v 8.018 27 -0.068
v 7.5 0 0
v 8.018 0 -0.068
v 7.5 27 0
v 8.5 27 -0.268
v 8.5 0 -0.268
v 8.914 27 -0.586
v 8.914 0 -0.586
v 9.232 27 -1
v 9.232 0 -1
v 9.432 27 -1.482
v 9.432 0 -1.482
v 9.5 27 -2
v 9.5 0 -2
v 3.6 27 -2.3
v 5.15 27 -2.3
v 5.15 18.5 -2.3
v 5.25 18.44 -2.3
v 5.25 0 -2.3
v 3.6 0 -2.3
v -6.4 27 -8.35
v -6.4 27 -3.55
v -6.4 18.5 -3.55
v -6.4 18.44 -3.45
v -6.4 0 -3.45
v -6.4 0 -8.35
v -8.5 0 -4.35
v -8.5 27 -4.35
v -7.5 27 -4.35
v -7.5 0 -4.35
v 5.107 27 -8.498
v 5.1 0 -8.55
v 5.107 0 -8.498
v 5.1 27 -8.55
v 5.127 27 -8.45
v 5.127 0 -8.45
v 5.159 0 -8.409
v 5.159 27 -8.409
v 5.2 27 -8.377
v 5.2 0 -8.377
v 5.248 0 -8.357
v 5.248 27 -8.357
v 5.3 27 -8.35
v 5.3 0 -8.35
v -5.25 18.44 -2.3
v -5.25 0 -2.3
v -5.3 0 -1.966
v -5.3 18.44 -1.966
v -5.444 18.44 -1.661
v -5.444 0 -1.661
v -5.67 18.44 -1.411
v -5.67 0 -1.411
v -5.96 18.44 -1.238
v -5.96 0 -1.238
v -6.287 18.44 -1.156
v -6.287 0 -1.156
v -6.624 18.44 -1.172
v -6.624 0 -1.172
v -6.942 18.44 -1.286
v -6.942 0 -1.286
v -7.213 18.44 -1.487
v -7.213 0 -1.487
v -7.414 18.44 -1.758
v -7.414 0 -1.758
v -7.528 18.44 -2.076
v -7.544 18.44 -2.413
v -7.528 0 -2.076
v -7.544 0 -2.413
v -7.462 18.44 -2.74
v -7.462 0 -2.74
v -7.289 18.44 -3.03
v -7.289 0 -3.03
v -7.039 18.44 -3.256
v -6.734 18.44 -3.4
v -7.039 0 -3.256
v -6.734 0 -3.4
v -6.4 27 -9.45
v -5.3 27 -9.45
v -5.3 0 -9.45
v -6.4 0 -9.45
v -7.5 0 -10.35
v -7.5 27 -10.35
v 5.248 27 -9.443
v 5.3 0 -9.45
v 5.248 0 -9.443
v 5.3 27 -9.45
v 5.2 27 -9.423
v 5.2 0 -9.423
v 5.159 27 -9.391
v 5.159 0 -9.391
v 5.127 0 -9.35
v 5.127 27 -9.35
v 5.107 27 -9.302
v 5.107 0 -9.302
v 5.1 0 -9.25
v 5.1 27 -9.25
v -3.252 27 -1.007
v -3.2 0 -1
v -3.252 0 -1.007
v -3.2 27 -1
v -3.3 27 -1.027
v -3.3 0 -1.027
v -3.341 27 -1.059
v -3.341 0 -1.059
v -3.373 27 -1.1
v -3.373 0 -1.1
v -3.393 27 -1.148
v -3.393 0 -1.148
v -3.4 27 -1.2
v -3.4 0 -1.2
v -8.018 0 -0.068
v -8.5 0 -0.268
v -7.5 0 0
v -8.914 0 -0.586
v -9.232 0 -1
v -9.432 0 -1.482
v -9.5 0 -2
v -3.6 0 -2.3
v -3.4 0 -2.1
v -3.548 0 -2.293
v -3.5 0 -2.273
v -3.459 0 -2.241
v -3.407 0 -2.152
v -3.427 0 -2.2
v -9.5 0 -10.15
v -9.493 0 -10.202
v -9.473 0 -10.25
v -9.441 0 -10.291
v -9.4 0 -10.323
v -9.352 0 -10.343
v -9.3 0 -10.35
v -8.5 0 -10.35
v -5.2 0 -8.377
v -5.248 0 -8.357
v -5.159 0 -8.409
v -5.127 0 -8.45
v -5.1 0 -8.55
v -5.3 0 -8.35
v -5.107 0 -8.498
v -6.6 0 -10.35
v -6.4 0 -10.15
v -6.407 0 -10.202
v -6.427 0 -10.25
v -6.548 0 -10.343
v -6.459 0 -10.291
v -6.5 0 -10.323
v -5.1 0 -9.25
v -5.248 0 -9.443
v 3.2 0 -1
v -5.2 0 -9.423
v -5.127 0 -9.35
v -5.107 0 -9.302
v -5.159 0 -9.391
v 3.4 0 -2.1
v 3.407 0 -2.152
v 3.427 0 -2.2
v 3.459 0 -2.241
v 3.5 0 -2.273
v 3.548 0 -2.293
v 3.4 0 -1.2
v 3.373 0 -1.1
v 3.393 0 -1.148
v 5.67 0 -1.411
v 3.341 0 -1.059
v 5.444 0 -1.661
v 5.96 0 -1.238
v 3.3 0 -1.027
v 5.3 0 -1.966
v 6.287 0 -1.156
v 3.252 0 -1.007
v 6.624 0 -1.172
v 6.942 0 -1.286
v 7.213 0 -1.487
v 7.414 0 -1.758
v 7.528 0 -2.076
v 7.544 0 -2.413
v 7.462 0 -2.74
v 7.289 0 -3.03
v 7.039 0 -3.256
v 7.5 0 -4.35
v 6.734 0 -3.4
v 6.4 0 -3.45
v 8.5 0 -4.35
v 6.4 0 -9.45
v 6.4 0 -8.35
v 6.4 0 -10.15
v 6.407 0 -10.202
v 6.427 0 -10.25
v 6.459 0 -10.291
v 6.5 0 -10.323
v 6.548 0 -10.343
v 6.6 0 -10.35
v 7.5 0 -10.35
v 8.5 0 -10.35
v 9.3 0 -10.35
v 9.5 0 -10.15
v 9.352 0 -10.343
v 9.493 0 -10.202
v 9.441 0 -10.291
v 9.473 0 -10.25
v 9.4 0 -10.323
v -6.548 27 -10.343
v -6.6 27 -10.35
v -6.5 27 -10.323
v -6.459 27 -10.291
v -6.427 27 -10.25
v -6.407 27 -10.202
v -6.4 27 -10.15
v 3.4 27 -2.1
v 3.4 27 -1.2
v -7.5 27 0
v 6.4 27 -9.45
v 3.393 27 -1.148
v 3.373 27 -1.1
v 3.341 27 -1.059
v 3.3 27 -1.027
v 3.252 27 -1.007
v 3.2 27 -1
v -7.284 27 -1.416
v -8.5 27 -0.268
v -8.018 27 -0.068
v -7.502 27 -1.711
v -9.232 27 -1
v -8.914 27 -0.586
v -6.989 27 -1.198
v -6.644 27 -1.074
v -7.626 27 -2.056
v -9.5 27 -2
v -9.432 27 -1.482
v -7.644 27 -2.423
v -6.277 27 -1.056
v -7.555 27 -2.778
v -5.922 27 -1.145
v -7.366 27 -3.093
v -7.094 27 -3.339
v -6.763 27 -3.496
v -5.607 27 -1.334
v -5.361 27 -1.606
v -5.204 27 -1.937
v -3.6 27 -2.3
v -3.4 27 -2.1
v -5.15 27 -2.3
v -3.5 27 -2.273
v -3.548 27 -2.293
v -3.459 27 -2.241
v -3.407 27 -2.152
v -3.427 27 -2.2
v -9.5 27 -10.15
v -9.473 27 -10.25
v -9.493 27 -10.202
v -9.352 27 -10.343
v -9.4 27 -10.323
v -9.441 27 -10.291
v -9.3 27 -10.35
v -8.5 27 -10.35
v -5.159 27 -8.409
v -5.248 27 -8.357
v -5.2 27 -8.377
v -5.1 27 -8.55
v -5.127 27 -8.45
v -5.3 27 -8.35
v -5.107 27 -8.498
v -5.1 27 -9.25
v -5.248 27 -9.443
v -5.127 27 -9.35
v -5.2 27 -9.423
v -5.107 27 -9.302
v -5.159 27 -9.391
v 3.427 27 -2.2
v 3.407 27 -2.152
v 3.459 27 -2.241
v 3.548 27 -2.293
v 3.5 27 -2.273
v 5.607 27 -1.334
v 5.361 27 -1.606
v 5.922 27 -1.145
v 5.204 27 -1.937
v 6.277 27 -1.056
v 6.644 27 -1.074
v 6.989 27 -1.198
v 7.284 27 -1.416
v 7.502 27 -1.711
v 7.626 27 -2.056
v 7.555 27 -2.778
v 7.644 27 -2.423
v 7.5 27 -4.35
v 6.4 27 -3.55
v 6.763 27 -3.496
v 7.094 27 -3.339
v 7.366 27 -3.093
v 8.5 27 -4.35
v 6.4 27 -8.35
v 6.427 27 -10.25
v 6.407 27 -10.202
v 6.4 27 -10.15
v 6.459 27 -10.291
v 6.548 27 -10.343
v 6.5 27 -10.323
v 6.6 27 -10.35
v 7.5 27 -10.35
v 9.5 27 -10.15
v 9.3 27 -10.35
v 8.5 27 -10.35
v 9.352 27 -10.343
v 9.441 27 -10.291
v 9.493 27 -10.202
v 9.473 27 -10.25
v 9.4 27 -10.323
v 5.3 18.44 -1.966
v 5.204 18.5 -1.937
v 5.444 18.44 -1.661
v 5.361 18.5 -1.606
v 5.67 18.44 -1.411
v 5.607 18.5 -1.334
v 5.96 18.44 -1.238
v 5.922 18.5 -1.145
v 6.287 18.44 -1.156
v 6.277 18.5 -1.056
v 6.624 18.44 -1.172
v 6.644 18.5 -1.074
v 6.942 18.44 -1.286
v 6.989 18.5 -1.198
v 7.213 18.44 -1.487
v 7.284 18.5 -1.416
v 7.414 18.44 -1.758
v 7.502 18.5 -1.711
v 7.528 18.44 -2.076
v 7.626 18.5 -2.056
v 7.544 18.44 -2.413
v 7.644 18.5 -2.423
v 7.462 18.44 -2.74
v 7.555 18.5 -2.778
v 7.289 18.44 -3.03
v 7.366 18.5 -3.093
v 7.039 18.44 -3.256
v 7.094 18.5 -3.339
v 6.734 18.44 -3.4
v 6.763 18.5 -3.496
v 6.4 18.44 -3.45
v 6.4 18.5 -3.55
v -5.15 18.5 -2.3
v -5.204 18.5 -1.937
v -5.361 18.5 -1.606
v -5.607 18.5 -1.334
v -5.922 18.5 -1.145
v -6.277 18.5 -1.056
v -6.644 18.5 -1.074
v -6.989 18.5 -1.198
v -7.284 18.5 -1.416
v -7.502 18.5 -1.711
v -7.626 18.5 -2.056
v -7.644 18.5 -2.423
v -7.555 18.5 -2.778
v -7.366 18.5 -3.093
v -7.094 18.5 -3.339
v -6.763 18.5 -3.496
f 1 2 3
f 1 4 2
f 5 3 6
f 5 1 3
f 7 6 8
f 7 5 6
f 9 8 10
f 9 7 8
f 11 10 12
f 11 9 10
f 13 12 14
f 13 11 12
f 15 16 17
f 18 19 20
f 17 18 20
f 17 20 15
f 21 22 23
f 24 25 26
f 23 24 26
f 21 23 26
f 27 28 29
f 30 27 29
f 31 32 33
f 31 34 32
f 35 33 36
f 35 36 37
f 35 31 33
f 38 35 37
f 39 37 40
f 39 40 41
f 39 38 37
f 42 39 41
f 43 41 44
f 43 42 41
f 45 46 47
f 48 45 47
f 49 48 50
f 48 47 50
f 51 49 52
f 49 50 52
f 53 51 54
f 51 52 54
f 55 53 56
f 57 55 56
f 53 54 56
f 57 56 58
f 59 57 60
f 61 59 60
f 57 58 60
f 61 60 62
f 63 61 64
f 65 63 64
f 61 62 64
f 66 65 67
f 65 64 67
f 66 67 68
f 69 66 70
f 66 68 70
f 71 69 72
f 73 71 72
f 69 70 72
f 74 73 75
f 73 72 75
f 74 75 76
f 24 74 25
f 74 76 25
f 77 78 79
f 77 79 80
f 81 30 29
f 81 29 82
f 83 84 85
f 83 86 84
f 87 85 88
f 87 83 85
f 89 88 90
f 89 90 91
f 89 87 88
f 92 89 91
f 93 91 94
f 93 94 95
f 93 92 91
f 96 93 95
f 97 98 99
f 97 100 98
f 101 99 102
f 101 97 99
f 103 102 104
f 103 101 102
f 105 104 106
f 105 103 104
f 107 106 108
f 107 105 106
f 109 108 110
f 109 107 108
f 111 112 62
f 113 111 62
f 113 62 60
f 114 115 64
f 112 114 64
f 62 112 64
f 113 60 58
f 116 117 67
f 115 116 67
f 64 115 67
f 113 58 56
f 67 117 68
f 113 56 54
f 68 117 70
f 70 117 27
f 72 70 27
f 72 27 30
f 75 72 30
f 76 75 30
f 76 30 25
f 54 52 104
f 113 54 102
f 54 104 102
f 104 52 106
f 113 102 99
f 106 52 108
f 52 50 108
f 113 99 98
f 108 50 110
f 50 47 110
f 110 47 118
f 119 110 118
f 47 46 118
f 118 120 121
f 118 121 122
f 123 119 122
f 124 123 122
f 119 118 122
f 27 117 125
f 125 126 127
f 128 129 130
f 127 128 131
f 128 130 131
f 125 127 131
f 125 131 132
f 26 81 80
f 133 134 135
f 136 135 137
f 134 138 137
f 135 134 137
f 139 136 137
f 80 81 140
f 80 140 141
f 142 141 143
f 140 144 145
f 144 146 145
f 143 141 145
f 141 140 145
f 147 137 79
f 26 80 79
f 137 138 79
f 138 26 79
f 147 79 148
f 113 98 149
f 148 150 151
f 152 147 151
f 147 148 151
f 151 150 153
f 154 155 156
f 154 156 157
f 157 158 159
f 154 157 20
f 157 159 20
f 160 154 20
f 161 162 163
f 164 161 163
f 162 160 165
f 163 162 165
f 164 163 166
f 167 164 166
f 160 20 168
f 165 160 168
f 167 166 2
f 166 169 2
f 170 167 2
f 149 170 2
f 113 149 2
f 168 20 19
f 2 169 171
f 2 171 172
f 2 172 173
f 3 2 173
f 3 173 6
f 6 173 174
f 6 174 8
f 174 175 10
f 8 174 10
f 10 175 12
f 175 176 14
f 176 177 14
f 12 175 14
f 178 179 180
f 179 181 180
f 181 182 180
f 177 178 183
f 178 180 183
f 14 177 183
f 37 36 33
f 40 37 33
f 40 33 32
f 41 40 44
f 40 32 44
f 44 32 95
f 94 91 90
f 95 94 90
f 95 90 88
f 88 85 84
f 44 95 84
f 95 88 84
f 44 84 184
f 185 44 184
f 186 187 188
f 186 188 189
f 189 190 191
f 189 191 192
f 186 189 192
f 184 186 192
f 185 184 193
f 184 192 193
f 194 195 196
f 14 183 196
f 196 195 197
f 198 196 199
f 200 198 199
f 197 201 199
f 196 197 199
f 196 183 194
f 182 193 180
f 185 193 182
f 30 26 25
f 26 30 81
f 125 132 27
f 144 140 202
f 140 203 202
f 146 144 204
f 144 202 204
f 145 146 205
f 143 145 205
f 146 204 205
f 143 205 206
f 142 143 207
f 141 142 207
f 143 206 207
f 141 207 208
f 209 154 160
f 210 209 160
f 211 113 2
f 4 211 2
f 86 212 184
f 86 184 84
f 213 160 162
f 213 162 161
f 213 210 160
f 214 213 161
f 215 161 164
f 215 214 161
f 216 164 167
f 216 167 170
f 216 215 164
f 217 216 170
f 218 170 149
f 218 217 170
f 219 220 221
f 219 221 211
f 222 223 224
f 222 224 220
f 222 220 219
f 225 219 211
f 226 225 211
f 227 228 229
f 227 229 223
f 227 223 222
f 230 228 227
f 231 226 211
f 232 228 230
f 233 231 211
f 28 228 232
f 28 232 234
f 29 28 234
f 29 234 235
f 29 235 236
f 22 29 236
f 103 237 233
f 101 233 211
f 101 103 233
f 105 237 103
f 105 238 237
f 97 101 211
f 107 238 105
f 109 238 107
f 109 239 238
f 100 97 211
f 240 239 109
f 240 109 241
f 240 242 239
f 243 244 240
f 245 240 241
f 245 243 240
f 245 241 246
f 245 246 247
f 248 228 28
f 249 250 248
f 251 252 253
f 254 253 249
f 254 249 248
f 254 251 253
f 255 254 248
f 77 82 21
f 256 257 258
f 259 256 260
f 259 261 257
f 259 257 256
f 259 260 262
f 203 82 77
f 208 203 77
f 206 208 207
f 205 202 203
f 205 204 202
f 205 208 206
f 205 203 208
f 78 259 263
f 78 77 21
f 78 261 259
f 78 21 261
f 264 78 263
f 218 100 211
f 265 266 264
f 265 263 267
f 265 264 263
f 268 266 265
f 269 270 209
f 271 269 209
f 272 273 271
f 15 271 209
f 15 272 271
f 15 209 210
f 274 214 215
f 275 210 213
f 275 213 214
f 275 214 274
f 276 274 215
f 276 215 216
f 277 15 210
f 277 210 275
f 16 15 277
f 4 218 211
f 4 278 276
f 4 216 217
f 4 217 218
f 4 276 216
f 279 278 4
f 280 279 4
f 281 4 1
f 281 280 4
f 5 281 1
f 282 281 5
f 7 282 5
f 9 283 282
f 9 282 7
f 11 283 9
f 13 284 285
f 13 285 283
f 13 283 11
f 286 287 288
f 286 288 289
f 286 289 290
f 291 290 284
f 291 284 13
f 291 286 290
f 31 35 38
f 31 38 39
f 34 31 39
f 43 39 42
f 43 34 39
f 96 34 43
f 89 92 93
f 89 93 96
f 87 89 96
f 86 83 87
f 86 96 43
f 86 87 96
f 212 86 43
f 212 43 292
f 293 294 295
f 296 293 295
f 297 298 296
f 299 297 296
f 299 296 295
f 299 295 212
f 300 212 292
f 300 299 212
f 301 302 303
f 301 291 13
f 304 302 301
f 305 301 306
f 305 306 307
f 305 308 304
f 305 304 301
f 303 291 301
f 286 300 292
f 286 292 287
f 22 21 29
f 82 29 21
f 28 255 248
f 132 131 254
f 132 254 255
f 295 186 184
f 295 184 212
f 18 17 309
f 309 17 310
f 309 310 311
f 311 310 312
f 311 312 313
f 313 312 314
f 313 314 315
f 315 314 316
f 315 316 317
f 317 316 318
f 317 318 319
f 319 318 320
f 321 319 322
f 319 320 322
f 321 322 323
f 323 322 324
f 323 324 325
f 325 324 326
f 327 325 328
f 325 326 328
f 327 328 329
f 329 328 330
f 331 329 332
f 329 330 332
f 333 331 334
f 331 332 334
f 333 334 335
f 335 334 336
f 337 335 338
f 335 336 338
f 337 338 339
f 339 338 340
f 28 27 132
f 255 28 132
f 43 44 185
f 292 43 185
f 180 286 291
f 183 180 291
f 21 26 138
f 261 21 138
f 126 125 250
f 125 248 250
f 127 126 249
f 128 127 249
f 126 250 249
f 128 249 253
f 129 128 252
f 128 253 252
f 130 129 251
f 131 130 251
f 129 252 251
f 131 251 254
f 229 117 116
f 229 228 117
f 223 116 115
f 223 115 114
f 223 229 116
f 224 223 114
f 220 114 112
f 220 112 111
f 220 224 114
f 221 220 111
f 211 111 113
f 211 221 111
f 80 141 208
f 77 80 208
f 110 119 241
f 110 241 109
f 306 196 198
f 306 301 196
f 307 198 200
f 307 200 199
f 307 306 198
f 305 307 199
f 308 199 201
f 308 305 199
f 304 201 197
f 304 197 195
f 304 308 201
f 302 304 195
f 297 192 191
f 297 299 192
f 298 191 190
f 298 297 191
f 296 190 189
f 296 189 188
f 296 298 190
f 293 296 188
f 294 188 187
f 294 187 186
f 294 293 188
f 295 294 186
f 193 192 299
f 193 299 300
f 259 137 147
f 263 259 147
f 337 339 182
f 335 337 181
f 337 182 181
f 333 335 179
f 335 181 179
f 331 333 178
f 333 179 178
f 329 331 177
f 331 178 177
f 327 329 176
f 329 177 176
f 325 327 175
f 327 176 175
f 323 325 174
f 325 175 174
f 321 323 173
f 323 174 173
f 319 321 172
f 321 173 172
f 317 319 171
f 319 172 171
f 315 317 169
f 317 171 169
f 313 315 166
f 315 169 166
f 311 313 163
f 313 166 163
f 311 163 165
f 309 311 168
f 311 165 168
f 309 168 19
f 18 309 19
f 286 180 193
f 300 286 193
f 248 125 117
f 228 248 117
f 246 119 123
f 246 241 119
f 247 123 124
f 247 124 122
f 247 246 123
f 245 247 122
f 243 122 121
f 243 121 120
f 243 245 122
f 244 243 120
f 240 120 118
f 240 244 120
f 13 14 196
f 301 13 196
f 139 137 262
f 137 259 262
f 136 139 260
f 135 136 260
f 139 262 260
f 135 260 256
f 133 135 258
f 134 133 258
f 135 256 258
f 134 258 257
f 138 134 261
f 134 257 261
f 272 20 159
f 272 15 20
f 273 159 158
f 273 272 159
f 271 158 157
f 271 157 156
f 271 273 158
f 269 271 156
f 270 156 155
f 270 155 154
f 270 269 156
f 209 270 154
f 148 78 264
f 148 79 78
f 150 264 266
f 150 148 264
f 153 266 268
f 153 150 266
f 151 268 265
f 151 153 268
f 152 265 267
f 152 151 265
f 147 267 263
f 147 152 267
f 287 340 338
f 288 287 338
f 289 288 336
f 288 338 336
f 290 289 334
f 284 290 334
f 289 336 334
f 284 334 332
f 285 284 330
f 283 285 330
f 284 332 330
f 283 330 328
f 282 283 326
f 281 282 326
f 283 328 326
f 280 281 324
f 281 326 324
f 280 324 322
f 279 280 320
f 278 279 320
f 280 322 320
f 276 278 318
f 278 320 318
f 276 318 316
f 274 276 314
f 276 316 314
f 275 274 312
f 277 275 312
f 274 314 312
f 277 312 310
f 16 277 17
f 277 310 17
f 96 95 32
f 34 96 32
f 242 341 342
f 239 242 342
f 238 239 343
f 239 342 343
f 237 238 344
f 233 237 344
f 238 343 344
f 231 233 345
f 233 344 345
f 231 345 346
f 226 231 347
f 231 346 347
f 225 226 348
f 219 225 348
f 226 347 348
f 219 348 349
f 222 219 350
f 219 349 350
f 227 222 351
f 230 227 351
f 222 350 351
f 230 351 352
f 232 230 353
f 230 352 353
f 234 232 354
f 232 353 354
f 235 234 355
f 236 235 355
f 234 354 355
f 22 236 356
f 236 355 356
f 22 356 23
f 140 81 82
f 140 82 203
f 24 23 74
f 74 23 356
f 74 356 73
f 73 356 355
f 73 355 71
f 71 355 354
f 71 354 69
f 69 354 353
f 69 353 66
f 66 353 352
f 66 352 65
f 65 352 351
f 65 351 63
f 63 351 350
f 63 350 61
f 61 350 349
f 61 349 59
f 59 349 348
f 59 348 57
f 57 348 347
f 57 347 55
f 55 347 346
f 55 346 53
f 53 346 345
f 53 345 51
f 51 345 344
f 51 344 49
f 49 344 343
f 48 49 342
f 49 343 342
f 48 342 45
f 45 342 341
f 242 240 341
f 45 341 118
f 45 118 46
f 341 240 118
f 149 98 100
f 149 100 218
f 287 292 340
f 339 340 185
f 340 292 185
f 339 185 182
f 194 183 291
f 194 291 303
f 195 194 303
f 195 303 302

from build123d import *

# Parameters (mm, degrees)
EXTRUDE_1_DEPTH        = 27
CUT_EXTRUDE_1_REACH    = 29
SKETCH_3_W             = 1
SKETCH_3_H             = 7
SKETCH_8_W             = 12.8
SKETCH_8_H             = 27
CUT_EXTRUDE_4_DEPTH    = 1.9
CUT_EXTRUDE_5_REACH    = 29
SKETCH_9_R             = 1.15
SKETCH_9_W             = 6.8
SKETCH_9_H             = 1.3
CUT_EXTRUDE_START      = -27
SKETCH_11_W            = 3.1
SKETCH_11_H            = 1
CUT_EXTRUDE_6_DEPTH    = 27
FILLET_1_R             = 2
FILLET_2_R             = 0.2
HOLE_WIZARD_M3_1_D     = 2.5
HOLE_WIZARD_M3_1_DEPTH = 8.5
HOLE_WIZARD_M3_1_TIP   = 0.751075774


with BuildPart() as part:
    # 草图1 → 凸台-拉伸1 (new body)
    with BuildSketch(Plane(origin=(0, 0, 0), x_dir=(1, 0, 0), z_dir=(0, 1, 0))):
        Polygon((-9.5, 11.35), (-9.5, 0), (9.5, 0), (9.5, 11.35), (5.1, 11.35), (5.1, 8.35), (6.4, 8.35), (6.4, 2.3), (-6.4, 2.3), (-6.4, 8.35), (-5.1, 8.35), (-5.1, 11.35), align=None)
    extrude(amount=EXTRUDE_1_DEPTH)

    # 草图3 → 切除-拉伸1 (cut, up to next)
    with BuildSketch(Plane(origin=(0, 27, 0), x_dir=(1, 0, 0), z_dir=(0, 1, 0)), mode=Mode.PRIVATE) as cut_extrude_1_sk1:
        with Locations((-8, 7.85)):
            Rectangle(SKETCH_3_W, SKETCH_3_H)
    cut_extrude_1_tool1 = extrude(cut_extrude_1_sk1.sketch, amount=-CUT_EXTRUDE_1_REACH, mode=Mode.PRIVATE) & part.part
    add(cut_extrude_1_tool1.solids().sort_by_distance((-8, 27, -7.85))[0], mode=Mode.SUBTRACT)
    # 草图3 → 切除-拉伸1 (cut, up to next)
    with BuildSketch(Plane(origin=(0, 27, 0), x_dir=(1, 0, 0), z_dir=(0, 1, 0)), mode=Mode.PRIVATE) as cut_extrude_1_sk2:
        with Locations((8, 7.85)):
            Rectangle(SKETCH_3_W, SKETCH_3_H)
    cut_extrude_1_tool2 = extrude(cut_extrude_1_sk2.sketch, amount=-CUT_EXTRUDE_1_REACH, mode=Mode.PRIVATE) & part.part
    add(cut_extrude_1_tool2.solids().sort_by_distance((8, 27, -7.85))[0], mode=Mode.SUBTRACT)

    # 草图8 → 切除-拉伸4 (cut)
    with BuildSketch(Plane(origin=(0, 0, -11.35), x_dir=(-1, 0, 0), z_dir=(0, 0, -1))):
        with Locations((0, 13.5)):
            Rectangle(SKETCH_8_W, SKETCH_8_H)
    extrude(amount=-CUT_EXTRUDE_4_DEPTH, mode=Mode.SUBTRACT)

    # 草图9 → 切除-拉伸5 (cut, up to next)
    with BuildSketch(Plane.XZ, mode=Mode.PRIVATE) as cut_extrude_5_sk1:
        with Locations((-6.4, -2.3)):
            Circle(SKETCH_9_R)
    cut_extrude_5_tool1 = extrude(cut_extrude_5_sk1.sketch, amount=-CUT_EXTRUDE_5_REACH, mode=Mode.PRIVATE) & part.part
    add(cut_extrude_5_tool1.solids().sort_by_distance((-6.4, 0, -2.3))[0], mode=Mode.SUBTRACT)
    # 草图9 → 切除-拉伸5 (cut, up to next)
    with BuildSketch(Plane.XZ, mode=Mode.PRIVATE) as cut_extrude_5_sk2:
        with Locations((6.4, -2.3)):
            Circle(SKETCH_9_R)
    cut_extrude_5_tool2 = extrude(cut_extrude_5_sk2.sketch, amount=-CUT_EXTRUDE_5_REACH, mode=Mode.PRIVATE) & part.part
    add(cut_extrude_5_tool2.solids().sort_by_distance((6.4, 0, -2.3))[0], mode=Mode.SUBTRACT)
    # 草图9 → 切除-拉伸5 (cut, up to next)
    with BuildSketch(Plane.XZ, mode=Mode.PRIVATE) as cut_extrude_5_sk3:
        with Locations((0, -1.65)):
            Rectangle(SKETCH_9_W, SKETCH_9_H)
    cut_extrude_5_tool3 = extrude(cut_extrude_5_sk3.sketch, amount=-CUT_EXTRUDE_5_REACH, mode=Mode.PRIVATE) & part.part
    add(cut_extrude_5_tool3.solids().sort_by_distance((0, 0, -1.65))[0], mode=Mode.SUBTRACT)

    # 草图11 → 切除-拉伸6 (cut)
    with BuildSketch(Plane(origin=(0, 27, 0), x_dir=(1, 0, 0), z_dir=(0, 1, 0)).offset(CUT_EXTRUDE_START)):
        with Locations((7.95, 10.85)):
            Rectangle(SKETCH_11_W, SKETCH_11_H)
        with Locations((-7.95, 10.85)):
            Rectangle(SKETCH_11_W, SKETCH_11_H)
    extrude(amount=CUT_EXTRUDE_6_DEPTH, mode=Mode.SUBTRACT)

    # 圆角1
    fillet_1_edges = [part.edges().sort_by_distance(p)[0] for p in [
        (9.5, 13.5, 0),
        (-9.5, 13.5, 0),
    ]]
    fillet(fillet_1_edges, radius=FILLET_1_R)

    # 圆角2
    fillet_2_edges = [part.edges().sort_by_distance(p)[0] for p in [
        (-3.4, 13.5, -2.3),
        (-3.4, 13.5, -1),
        (3.4, 13.5, -1),
        (3.4, 13.5, -2.3),
        (9.5, 13.5, -10.35),
        (-9.5, 13.5, -10.35),
        (6.4, 13.5, -10.35),
        (-6.4, 13.5, -10.35),
        (-5.1, 13.5, -8.35),
        (5.1, 13.5, -8.35),
        (5.1, 13.5, -9.45),
        (-5.1, 13.5, -9.45),
    ]]
    fillet(fillet_2_edges, radius=FILLET_2_R)

    # M3 螺纹孔1
    with Locations(Plane(origin=(0, 27, 0), x_dir=(1, 0, 0), z_dir=(0, 1, 0))):
        with Locations((-6.4, 2.3), (6.4, 2.3)):
            Hole(HOLE_WIZARD_M3_1_D / 2, depth=HOLE_WIZARD_M3_1_DEPTH)
            with Locations((0, 0, -(HOLE_WIZARD_M3_1_DEPTH + HOLE_WIZARD_M3_1_TIP / 2))):  # 118° drill point
                Cone(0, HOLE_WIZARD_M3_1_D / 2, HOLE_WIZARD_M3_1_TIP, mode=Mode.SUBTRACT)


solid = part.part
